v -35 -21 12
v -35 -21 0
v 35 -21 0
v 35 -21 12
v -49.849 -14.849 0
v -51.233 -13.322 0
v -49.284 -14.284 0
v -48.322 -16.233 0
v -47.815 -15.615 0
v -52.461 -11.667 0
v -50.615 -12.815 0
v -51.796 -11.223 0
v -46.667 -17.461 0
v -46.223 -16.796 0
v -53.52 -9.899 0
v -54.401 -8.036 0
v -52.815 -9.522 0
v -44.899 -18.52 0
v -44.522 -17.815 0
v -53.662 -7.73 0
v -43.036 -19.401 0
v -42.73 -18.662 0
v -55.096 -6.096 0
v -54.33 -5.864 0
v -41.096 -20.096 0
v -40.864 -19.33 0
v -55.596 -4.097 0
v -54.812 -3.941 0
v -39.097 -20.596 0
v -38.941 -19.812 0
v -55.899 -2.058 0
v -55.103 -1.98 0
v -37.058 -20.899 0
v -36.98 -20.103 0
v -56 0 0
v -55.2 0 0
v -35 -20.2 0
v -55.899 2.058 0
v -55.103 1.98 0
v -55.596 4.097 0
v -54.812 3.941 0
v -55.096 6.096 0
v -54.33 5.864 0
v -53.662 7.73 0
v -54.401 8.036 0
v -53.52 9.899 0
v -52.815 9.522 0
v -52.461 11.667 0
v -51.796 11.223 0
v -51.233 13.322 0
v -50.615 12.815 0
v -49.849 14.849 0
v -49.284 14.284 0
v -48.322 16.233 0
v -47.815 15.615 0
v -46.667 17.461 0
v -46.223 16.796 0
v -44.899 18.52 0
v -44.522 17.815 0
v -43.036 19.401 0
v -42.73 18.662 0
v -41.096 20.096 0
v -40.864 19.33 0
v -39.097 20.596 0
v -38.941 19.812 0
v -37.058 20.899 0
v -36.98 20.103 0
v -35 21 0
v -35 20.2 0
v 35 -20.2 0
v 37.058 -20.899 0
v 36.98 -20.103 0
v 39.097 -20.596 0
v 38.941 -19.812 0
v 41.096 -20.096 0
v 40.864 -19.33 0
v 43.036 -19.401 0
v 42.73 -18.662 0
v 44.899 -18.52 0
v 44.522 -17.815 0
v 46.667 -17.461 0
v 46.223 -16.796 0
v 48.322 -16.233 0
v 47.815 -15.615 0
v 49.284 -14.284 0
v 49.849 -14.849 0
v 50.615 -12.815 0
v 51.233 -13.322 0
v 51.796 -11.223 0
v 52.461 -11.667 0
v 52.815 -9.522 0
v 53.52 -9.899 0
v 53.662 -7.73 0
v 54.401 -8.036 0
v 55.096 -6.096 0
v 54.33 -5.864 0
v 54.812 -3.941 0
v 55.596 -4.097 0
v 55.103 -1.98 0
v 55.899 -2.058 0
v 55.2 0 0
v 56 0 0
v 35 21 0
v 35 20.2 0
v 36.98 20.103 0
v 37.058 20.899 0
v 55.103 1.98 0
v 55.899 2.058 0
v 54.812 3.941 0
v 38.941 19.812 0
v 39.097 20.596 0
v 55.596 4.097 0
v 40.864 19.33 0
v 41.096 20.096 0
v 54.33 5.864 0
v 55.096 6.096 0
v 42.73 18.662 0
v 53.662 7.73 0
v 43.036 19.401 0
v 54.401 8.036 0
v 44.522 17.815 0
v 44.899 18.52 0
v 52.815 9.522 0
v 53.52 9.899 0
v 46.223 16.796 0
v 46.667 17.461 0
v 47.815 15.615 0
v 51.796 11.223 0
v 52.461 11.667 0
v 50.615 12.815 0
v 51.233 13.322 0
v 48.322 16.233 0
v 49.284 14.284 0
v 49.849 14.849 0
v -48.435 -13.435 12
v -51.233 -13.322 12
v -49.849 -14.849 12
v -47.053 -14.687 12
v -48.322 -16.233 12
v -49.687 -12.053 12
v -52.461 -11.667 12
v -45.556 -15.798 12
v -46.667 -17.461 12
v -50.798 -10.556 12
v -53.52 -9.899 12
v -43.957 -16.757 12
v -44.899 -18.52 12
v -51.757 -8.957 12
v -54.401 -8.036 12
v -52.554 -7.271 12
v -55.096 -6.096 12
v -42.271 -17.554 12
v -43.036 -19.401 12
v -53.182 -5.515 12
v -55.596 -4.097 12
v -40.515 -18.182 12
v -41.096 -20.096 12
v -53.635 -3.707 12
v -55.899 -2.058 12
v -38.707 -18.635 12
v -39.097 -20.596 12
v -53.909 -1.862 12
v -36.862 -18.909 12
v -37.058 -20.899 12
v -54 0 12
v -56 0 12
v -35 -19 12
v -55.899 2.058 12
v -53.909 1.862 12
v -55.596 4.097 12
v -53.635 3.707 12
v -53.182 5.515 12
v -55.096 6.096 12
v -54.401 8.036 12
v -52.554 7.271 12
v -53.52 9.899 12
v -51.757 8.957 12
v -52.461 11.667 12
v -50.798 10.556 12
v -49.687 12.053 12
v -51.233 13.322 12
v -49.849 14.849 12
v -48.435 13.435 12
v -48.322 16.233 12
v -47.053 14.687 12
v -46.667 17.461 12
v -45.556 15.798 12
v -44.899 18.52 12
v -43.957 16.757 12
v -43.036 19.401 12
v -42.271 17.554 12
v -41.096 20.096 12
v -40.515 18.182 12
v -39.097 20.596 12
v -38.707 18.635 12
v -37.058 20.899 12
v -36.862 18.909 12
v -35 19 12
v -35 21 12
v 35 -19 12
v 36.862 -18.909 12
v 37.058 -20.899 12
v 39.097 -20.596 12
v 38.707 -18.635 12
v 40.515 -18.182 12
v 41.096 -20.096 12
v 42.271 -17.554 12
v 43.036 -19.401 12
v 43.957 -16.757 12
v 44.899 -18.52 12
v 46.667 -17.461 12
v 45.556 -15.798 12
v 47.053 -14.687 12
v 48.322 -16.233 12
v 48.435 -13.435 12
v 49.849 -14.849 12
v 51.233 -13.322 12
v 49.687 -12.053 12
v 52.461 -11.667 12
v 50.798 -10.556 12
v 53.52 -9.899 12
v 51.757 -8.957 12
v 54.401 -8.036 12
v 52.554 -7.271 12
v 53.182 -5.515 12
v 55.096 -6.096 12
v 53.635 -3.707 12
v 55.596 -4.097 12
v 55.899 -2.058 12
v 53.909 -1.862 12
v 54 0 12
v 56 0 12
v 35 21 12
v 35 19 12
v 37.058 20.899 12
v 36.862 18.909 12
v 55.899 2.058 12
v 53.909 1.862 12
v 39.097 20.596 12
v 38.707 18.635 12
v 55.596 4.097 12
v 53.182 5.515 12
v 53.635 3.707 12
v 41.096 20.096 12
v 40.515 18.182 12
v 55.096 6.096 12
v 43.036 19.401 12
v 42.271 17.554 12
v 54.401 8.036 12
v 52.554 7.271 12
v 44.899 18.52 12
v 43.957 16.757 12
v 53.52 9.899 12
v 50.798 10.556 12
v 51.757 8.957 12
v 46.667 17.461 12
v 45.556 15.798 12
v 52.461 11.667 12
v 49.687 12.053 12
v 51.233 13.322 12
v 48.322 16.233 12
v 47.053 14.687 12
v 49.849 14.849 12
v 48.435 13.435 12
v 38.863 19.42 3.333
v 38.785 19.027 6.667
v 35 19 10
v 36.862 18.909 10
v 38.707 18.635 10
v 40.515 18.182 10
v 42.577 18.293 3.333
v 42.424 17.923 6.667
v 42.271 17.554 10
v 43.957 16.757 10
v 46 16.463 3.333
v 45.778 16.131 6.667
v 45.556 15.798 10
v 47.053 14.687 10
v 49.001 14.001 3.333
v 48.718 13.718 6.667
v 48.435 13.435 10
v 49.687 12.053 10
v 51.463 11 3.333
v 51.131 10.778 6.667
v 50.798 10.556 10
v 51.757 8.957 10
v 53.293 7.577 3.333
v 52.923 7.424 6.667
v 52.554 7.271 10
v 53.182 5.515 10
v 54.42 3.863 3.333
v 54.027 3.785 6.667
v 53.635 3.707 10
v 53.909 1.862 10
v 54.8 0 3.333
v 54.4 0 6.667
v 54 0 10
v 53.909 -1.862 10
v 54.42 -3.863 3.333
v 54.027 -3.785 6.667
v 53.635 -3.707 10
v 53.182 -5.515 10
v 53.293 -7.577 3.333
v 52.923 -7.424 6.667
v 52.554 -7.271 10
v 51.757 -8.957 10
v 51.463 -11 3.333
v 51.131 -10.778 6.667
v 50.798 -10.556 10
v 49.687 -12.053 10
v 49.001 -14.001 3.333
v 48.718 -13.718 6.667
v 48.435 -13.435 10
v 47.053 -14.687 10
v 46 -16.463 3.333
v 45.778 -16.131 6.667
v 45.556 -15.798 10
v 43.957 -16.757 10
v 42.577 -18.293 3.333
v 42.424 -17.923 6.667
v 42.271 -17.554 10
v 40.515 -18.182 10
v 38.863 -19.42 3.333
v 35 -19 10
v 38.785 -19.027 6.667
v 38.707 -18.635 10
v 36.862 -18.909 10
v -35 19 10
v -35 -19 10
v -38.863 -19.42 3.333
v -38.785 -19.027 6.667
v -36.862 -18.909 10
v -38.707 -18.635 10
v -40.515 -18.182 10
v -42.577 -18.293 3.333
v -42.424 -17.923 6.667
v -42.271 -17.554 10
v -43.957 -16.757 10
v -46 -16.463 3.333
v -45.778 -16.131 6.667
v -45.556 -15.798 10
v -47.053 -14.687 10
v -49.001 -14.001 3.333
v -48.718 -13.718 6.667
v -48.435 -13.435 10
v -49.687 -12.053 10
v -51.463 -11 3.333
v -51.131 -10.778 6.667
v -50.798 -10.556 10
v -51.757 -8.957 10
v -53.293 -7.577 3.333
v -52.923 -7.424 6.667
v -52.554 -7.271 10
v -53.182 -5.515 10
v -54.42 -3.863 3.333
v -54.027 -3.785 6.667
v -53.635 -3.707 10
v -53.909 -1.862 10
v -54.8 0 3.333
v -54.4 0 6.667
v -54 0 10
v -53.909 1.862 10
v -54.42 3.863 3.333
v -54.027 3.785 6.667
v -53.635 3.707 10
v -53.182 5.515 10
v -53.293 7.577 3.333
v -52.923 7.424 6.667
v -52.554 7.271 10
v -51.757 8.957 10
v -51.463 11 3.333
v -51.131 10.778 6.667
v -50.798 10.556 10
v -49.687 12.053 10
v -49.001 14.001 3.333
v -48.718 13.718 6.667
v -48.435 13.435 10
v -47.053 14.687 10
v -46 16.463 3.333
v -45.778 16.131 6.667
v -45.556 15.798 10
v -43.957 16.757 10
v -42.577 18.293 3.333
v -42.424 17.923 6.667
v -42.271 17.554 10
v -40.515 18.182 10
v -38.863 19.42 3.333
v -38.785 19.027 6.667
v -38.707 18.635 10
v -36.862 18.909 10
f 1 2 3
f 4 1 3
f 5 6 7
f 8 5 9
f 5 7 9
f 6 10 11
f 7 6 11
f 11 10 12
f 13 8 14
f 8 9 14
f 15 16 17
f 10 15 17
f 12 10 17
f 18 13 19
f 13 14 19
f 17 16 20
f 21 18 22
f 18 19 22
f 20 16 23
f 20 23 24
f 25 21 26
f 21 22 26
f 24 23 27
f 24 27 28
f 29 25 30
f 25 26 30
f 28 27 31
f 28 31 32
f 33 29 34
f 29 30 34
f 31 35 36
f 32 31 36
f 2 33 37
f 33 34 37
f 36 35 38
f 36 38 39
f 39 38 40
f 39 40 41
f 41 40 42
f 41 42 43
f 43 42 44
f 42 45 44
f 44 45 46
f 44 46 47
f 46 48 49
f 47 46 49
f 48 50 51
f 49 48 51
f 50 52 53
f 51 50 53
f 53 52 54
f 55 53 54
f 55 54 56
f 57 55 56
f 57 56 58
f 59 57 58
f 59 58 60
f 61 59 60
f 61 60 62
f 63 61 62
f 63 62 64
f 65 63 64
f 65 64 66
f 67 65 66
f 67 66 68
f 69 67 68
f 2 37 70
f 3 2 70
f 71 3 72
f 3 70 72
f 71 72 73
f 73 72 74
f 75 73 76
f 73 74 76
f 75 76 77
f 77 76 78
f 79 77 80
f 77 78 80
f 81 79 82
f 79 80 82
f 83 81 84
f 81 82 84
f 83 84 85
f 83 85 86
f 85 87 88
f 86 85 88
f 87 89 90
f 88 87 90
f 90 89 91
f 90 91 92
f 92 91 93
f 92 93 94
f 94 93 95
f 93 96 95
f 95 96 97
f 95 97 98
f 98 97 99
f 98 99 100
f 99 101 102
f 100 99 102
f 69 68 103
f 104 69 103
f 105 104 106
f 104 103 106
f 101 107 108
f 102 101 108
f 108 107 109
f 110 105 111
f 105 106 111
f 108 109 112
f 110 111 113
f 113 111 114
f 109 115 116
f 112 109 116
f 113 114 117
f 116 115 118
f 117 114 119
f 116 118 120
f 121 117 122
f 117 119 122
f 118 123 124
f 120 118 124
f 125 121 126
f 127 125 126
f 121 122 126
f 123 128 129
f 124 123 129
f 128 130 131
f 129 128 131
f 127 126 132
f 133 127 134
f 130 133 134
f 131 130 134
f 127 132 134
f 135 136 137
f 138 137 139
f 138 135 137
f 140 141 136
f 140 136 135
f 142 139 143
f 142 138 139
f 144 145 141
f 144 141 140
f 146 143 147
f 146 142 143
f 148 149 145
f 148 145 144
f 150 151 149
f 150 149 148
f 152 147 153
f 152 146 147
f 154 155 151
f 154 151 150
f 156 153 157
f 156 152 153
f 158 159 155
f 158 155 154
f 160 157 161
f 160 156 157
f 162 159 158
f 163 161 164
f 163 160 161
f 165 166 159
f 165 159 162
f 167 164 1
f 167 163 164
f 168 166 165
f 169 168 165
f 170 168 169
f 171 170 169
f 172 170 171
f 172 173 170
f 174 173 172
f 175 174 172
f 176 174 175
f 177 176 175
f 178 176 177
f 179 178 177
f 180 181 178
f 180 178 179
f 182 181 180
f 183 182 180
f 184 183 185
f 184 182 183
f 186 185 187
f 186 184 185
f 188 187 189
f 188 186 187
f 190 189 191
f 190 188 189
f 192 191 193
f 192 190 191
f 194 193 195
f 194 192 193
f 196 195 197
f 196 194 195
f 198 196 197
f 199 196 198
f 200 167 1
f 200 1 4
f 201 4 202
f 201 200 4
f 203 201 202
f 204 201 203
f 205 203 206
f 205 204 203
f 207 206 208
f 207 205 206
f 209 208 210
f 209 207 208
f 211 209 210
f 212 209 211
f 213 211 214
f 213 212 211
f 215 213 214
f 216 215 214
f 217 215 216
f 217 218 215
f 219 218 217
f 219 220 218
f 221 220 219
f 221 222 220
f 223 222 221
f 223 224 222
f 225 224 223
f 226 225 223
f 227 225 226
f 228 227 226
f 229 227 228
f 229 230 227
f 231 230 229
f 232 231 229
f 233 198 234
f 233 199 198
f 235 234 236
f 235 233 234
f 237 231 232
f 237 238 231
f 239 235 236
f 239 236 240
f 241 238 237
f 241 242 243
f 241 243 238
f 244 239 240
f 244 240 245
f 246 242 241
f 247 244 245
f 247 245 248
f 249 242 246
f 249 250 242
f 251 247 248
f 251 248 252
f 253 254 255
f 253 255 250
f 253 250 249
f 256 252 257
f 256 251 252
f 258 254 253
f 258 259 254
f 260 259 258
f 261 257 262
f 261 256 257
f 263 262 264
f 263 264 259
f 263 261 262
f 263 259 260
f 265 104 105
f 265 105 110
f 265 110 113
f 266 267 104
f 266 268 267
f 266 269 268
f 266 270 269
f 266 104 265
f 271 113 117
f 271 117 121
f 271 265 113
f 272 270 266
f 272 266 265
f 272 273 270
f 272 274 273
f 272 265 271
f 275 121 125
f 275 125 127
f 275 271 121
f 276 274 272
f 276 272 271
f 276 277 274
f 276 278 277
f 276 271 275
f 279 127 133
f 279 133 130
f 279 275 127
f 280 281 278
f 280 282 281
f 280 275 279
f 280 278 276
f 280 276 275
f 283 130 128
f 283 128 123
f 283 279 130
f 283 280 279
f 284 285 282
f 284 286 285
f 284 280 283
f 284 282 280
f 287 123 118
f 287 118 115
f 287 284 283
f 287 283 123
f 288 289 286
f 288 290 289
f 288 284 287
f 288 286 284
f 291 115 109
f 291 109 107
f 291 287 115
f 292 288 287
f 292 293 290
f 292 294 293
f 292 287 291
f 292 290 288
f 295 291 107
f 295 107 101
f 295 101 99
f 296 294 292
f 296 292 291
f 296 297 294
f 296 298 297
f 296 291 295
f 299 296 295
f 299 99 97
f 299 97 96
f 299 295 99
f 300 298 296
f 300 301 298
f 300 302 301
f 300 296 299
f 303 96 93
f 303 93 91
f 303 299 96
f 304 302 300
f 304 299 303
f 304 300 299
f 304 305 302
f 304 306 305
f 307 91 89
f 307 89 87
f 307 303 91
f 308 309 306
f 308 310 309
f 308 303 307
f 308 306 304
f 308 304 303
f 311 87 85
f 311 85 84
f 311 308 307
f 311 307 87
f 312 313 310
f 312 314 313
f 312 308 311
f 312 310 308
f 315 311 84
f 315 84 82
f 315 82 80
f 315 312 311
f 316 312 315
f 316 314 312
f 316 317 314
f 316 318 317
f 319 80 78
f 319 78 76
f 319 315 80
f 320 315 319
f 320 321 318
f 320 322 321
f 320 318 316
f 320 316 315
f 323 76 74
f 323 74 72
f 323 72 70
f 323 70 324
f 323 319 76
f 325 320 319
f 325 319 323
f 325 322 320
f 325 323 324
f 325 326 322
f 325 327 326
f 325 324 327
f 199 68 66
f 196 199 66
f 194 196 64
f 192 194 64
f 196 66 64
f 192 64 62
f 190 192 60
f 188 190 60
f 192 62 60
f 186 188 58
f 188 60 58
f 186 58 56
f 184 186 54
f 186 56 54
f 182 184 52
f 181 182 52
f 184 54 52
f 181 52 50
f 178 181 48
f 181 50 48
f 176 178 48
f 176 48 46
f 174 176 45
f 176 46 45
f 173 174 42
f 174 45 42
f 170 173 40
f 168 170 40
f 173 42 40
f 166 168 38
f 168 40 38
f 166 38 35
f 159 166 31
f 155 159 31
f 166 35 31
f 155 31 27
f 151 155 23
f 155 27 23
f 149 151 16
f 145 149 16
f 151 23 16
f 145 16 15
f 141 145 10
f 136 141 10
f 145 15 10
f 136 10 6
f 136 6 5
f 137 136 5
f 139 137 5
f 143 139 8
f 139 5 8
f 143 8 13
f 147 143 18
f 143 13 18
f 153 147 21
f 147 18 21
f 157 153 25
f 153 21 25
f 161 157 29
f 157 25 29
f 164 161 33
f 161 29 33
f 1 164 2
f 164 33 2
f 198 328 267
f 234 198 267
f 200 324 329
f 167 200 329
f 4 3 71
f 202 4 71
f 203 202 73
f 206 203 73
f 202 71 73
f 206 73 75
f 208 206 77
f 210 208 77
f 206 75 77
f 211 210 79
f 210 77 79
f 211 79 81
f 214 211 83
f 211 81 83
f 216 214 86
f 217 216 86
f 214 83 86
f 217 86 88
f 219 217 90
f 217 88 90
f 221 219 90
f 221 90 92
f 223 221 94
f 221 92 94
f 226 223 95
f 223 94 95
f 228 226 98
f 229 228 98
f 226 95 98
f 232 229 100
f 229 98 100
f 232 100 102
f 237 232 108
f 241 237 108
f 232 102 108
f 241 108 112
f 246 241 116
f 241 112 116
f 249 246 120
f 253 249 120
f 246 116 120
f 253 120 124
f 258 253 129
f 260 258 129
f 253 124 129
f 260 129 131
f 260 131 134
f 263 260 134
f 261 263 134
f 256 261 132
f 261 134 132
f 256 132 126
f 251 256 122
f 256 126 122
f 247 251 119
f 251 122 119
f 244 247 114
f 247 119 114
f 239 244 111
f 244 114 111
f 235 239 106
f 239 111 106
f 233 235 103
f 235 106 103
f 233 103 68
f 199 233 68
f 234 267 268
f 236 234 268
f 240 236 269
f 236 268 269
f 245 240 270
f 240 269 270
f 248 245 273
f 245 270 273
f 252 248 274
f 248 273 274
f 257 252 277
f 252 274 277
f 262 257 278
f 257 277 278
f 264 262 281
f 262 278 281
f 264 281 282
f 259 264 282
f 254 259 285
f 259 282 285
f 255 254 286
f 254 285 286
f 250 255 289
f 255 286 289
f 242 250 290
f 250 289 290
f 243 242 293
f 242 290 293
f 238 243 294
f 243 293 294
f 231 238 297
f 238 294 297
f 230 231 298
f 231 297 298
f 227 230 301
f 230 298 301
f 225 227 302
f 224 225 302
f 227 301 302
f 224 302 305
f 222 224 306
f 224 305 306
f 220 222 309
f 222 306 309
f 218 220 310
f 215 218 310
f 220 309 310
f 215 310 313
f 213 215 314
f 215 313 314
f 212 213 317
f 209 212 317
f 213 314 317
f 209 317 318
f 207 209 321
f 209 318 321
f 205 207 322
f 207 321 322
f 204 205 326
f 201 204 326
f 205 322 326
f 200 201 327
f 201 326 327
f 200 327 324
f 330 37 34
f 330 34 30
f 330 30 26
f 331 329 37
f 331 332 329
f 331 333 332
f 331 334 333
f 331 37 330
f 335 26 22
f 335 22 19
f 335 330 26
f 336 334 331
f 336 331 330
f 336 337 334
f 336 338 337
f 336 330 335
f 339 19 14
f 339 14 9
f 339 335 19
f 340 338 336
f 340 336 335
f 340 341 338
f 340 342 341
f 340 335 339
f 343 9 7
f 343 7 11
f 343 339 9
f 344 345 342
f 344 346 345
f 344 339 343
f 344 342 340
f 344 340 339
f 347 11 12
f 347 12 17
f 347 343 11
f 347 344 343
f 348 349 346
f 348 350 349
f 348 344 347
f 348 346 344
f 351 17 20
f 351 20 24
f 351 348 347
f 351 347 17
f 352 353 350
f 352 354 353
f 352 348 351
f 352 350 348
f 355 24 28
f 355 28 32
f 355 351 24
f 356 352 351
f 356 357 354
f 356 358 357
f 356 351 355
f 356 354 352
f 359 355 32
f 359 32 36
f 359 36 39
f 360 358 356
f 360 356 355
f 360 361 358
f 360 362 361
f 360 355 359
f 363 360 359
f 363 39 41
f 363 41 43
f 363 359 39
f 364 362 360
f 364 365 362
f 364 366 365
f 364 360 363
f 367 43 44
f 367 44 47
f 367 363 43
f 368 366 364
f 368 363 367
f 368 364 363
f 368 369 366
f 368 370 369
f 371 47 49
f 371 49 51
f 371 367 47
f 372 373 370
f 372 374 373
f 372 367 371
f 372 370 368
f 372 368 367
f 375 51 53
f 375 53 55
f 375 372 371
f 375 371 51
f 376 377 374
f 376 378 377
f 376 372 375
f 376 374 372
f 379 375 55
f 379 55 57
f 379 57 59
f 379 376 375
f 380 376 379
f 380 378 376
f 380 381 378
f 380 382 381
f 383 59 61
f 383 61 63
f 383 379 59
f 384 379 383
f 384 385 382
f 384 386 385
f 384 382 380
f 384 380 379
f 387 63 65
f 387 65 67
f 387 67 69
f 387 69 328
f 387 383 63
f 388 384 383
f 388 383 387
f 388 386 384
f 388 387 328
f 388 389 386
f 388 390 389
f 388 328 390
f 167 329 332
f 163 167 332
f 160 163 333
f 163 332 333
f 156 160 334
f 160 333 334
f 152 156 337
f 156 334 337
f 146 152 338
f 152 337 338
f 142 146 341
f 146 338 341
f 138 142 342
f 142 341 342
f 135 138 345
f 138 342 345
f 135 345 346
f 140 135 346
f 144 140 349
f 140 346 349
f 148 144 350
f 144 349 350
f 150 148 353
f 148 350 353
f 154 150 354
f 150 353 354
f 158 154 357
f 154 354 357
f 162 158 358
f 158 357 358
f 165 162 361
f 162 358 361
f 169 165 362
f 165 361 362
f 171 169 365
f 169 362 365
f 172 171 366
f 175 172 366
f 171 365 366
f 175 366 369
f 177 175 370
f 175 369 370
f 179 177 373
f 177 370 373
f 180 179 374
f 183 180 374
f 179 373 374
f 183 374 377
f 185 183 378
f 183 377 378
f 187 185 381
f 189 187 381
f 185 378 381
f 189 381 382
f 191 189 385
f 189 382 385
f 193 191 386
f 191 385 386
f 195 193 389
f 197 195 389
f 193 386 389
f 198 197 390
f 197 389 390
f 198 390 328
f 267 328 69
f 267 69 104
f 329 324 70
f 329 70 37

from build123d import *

# Parameters (mm, degrees)
F1_DEPTH = 12
F2_SIZE2 = 10
F2_SIZE  = 1.2


with BuildPart() as f1:
    # F0 (on Top) → F1 (new body)
    with BuildSketch(Plane.XY):
        with BuildLine():
            Line((35, 21), (-35, 21))
            ThreePointArc((-35, 21), (-56, 0), (-35, -21))
            Line((-35, -21), (35, -21))
            ThreePointArc((35, -21), (56, 0), (35, 21))
        make_face()
        with BuildLine():
            Line((35, -19), (-35, -19))
            ThreePointArc((-35, -19), (-54, 0), (-35, 19))
            Line((-35, 19), (35, 19))
            ThreePointArc((35, 19), (54, 0), (35, -19))
        make_face(mode=Mode.SUBTRACT)
    extrude(amount=F1_DEPTH)

    # F2
    f2_edges = [f1.edges().sort_by_distance(p)[0] for p in [
        (0, -19, 0),
    ]]
    f2_side = f1.faces().sort_by_distance((0, 19.803839, 0))[0]
    chamfer(f2_edges, length=F2_SIZE, length2=F2_SIZE2, reference=f2_side)


solid = f1.part
